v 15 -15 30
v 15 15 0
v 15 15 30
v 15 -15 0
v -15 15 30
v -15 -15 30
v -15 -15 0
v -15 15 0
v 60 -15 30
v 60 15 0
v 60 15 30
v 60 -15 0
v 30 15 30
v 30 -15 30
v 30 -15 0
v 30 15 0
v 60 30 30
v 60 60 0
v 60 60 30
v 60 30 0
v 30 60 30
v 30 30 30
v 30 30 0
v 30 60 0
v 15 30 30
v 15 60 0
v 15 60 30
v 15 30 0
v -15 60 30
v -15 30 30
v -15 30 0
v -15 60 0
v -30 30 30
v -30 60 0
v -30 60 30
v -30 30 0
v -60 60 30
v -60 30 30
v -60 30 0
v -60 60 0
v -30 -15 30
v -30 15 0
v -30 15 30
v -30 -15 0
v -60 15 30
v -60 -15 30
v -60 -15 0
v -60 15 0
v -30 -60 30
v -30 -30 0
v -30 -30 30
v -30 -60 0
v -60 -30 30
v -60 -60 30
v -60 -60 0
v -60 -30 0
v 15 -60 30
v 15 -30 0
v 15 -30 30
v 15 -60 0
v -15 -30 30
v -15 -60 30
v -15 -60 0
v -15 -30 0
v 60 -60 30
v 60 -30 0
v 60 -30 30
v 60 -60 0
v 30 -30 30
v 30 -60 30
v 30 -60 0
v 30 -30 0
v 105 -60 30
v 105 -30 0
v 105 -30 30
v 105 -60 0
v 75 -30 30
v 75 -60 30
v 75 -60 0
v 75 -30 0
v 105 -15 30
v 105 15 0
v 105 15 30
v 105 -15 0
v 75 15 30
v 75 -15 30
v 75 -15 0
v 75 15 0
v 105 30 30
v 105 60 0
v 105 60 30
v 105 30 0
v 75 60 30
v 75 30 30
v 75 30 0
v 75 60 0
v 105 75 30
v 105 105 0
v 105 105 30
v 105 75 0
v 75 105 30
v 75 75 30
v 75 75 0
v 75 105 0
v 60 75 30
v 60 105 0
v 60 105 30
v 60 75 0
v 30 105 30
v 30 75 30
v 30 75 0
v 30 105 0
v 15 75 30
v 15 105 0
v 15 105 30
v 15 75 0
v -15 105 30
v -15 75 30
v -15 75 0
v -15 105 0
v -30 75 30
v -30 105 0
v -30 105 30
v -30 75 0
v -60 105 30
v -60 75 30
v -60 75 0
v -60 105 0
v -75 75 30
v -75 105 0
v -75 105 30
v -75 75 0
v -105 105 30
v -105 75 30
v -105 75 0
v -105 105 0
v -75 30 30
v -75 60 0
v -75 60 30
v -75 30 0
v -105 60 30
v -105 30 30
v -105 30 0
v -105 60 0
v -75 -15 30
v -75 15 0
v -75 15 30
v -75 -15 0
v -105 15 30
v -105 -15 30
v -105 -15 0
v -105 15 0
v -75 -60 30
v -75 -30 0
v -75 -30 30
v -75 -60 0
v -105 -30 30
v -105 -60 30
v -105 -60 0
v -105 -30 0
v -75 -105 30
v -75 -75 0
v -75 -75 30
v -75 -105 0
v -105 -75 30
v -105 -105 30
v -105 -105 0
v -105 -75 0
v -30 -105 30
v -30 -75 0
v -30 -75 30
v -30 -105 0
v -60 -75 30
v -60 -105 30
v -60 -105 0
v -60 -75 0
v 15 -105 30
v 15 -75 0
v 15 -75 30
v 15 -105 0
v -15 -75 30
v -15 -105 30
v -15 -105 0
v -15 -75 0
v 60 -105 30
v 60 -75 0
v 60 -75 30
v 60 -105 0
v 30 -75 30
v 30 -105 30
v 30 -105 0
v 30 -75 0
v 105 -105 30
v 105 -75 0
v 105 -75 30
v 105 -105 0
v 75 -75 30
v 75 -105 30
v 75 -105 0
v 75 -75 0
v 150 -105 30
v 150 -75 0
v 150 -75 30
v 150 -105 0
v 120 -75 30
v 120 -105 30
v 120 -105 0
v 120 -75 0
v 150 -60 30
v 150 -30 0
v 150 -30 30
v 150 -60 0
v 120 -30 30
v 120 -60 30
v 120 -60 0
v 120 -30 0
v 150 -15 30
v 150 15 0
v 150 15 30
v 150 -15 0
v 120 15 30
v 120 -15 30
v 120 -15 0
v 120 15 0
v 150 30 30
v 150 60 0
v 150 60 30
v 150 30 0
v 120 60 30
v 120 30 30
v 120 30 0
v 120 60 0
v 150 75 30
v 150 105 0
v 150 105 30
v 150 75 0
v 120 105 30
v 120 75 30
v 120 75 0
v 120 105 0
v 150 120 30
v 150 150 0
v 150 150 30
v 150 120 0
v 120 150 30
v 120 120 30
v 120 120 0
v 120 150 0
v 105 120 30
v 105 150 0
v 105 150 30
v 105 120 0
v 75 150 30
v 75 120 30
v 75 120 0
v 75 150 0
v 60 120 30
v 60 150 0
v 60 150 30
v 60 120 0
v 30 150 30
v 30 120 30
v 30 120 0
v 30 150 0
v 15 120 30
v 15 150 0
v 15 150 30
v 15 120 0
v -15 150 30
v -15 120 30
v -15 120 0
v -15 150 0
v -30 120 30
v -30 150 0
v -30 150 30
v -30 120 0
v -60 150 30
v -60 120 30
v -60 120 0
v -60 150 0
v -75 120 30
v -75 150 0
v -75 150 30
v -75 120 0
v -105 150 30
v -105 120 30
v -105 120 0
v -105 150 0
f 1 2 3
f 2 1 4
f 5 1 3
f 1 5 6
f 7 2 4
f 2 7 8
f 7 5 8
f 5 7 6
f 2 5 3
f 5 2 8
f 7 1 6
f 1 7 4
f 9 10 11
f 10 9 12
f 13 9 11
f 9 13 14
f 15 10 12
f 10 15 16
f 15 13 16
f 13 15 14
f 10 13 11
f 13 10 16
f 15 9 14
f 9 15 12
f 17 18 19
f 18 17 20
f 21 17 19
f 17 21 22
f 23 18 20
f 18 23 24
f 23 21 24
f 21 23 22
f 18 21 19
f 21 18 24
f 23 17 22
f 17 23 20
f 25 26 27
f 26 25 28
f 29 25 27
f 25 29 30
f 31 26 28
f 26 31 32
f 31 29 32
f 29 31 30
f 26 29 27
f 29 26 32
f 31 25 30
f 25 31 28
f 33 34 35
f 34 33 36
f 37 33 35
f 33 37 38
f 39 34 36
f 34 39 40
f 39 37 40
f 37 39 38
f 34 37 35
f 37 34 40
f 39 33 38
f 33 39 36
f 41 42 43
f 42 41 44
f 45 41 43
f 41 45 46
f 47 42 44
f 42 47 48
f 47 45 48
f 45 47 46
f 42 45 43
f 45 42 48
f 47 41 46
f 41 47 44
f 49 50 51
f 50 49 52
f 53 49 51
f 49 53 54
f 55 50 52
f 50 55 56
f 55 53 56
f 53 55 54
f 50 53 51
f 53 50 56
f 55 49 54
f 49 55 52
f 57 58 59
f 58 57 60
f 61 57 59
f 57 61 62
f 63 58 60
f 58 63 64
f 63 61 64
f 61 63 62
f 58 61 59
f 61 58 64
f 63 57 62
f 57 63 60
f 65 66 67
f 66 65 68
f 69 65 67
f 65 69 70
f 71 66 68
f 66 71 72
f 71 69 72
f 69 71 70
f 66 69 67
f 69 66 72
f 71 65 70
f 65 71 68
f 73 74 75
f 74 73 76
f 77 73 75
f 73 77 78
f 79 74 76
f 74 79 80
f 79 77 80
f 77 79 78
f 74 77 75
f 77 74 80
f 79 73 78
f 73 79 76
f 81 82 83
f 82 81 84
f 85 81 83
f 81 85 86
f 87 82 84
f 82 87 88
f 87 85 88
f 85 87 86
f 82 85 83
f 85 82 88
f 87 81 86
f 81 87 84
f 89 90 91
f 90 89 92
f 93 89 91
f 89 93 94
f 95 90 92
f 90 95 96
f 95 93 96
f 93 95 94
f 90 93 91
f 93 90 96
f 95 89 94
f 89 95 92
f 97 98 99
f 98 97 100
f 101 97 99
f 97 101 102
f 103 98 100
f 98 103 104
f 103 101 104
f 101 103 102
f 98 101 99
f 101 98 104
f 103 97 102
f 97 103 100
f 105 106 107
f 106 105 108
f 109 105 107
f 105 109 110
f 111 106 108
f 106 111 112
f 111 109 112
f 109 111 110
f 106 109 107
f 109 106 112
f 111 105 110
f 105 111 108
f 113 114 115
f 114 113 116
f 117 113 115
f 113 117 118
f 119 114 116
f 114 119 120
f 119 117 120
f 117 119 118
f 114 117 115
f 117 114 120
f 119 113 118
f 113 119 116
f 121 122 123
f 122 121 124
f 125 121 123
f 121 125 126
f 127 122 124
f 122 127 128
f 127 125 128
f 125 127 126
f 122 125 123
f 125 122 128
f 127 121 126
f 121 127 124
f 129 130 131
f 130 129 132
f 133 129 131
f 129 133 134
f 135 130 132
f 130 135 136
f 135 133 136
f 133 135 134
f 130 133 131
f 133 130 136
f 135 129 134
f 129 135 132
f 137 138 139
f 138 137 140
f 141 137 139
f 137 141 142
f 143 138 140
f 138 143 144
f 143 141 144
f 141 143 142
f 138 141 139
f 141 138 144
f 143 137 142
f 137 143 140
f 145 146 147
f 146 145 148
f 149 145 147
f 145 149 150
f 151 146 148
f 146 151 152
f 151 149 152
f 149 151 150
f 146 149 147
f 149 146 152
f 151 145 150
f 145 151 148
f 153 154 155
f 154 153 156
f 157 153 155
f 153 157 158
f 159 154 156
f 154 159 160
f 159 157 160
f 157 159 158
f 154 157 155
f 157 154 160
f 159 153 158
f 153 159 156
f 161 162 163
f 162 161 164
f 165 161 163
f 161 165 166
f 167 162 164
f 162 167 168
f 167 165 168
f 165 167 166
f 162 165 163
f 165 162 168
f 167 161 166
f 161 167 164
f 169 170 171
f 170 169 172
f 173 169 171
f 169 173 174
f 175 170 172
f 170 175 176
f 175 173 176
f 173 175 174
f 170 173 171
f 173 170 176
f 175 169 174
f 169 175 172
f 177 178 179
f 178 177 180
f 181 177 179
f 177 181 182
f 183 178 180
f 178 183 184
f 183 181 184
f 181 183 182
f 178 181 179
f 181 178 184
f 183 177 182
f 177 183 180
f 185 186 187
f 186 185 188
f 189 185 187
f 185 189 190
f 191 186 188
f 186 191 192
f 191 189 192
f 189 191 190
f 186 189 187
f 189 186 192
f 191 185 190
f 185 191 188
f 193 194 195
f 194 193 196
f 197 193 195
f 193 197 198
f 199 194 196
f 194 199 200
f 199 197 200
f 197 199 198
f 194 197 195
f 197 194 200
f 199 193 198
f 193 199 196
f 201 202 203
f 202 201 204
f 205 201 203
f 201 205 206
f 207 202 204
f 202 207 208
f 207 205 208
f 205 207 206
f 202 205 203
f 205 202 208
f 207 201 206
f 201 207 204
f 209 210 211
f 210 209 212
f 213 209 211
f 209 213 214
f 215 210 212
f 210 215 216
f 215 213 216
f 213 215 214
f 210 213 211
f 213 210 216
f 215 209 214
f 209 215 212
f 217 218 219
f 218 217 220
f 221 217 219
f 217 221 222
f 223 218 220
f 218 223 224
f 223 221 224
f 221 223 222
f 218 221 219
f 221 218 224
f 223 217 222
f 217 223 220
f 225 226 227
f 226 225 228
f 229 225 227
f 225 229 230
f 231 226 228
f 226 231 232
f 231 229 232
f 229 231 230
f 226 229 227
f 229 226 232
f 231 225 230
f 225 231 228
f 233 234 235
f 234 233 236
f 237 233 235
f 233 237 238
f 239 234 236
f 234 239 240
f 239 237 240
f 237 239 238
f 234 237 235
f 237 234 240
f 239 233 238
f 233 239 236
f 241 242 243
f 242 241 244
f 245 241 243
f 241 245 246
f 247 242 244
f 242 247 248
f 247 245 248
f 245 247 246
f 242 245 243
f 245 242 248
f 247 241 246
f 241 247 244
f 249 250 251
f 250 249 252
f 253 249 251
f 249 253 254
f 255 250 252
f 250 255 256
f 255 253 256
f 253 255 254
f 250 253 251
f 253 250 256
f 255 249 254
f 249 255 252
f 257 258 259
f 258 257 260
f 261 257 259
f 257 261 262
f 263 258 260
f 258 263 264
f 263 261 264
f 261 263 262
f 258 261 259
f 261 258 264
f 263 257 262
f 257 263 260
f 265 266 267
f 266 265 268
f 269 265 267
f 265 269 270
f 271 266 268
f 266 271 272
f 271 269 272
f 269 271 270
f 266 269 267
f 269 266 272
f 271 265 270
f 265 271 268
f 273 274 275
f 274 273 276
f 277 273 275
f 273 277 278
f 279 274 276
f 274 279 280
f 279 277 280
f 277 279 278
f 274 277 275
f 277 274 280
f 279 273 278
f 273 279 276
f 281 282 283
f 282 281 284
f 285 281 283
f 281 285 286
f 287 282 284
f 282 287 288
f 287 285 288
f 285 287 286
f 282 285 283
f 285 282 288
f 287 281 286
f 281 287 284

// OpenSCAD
//------------------------------------------------------------------------------------------
// THIS CODE WAS GENERATED WITH GRAPHSCAD
//------------------------------------------------------------------------------------------
// F:/workspace/graphscad/graphscadfiles/ulam_spiral.scad
//------------------------------------------------------------------------------------------
// Graphscad is a graphical nodal editor to create .SCAD files
//
// More info here : http://graphscad.free.fr
//
// Scad Files created with Graphscad can be edited by graphscad
// Scad Files created with Graphscad can be read by Openscad
//
//------------------------------------------------------------------------------------------
$vpr=[60,0,300];
$vpt=[22,22,15];
$vpd=780;
module ulam_spiral(primefield=[
[ 0,  0,  1,1,1,0,0,0,0,0],
[1, 0, 2,1,2,0,0,0,0,0],
[1, 1, 3,1,3,0,0,0,0,0],
[0, 1, 4,2,2,2,0,0,0,0],
[-1, 1, 5,1,5,0,0,0,0,0],
[-1, 0, 6,2,2,3,0,0,0,0],
[-1, -1, 7,1,7,0,0,0,0,0],
[0, -1, 8,3,2,2,2,0,0,0],
[1, -1, 9,2,3,3,0,0,0,0],
[2, -1, 10,2,2,5,0,0,0,0],
[2, 0, 11,1,11,0,0,0,0,0],
[2, 1, 12,3,2,2,3,0,0,0],
[2, 2, 13,1,13,0,0,0,0,0],
[1, 2, 14,2,2,7,0,0,0,0],
[0, 2, 15,2,3,5,0,0,0,0],
[-1, 2, 16,4,2,2,2,2,0,0],
[-2, 2, 17,1,17,0,0,0,0,0],
[-2, 1, 18,3,2,3,3,0,0,0],
[-2, 0, 19,1,19,0,0,0,0,0],
[-2, -1, 20,3,2,2,5,0,0,0],
[-2, -2, 21,2,3,7,0,0,0,0],
[-1, -2, 22,2,2,11,0,0,0,0],
[0, -2, 23,1,23,0,0,0,0,0],
[1, -2, 24,4,2,2,2,3,0,0],
[2, -2, 25,2,5,5,0,0,0,0],
[3, -2, 26,2,2,13,0,0,0,0],
[3, -1, 27,3,3,3,3,0,0,0],
[3, 0, 28,3,2,2,7,0,0,0],
[3, 1, 29,1,29,0,0,0,0,0],
[3, 2, 30,3,2,3,5,0,0,0],
[3, 3, 31,1,31,0,0,0,0,0],
[2, 3, 32,5,2,2,2,2,2,0],
[1, 3, 33,2,3,11,0,0,0,0],
[0, 3, 34,2,2,17,0,0,0,0],
[-1, 3, 35,2,5,7,0,0,0,0,0],
[-2, 3, 36,4,2,2,3,3,0,0]
],feldbreite=45,wuerfelseite=30)
{
 function node_cube_matrix(i=0,j=0,k=0,l=0,m=0,n=0) = translate([-wuerfelseite/2,-wuerfelseite/2,0]);
 module node_cube(i=0,j=0,k=0,l=0,m=0,n=0)
 {
  translate([-wuerfelseite/2,-wuerfelseite/2,0])cube([wuerfelseite,wuerfelseite,wuerfelseite],center=false);
 }
 function node_color_matrix(i=0,j=0,k=0,l=0,m=0,n=0) = node_cube_matrix(i=i,j=j,k=k,l=l,m=m,n=n);
 module node_color(i=0,j=0,k=0,l=0,m=0,n=0)
 {
  {
   color([0,0,0,1])node_cube(i,j,k,l,m,n);
  }
 }
 function node_color0_matrix(i=0,j=0,k=0,l=0,m=0,n=0) = node_cube_matrix(i=i,j=j,k=k,l=l,m=m,n=n);
 module node_color0(i=0,j=0,k=0,l=0,m=0,n=0)
 {
  {
   color([1,1,1,1])node_cube(i,j,k,l,m,n);
  }
 }
 function node_for_matrix(i=0,j=0,k=0,l=0,m=0,n=0) = node_translate_matrix(i=i,j=j,k=k,l=l,m=m,n=n);
 module node_for(i=0,j=0,k=0,l=0,m=0,n=0)
 {
  for(i=[0:1:len(primefield)-1])
  {
   node_translate(i,j,k,l,m,n);
  }
 }
 function node_translate_matrix(i=0,j=0,k=0,l=0,m=0,n=0) = translate([primefield[i][0]*feldbreite,primefield[i][1]*feldbreite,0])*node_switchcase_matrix(i=i,j=j,k=k,l=l,m=m,n=n);
 module node_translate(i=0,j=0,k=0,l=0,m=0,n=0)
 {
  translate([primefield[i][0]*feldbreite,primefield[i][1]*feldbreite,0])node_switchcase(i,j,k,l,m,n);
 }
 function node_color1_matrix(i=0,j=0,k=0,l=0,m=0,n=0) = node_cube_matrix(i=i,j=j,k=k,l=l,m=m,n=n);
 module node_color1(i=0,j=0,k=0,l=0,m=0,n=0)
 {
  {
   color([1,1,0,1])node_cube(i,j,k,l,m,n);
  }
 }
 function node_switchcase_matrix(i=0,j=0,k=0,l=0,m=0,n=0) = node_color1_matrix(i=i,j=j,k=k,l=l,m=m,n=n);
 module node_switchcase(i=0,j=0,k=0,l=0,m=0,n=0)
 {
  if(primefield[i][2]==1)
  {
   node_color1(i,j,k,l,m,n);
  }
  else
  {
   if(primefield[i][3]==1)
   {
    node_color(i,j,k,l,m,n);
   }
   else
   {
    if(true)
    {
     node_color0(i,j,k,l,m,n);
    }
   }
  }
 }
 node_for();
 /*--------------------------------------------------------------------------------------------------------
  Graphscad Utils functions
  This code is Used By Graphscad Nodal Editor to generate SCAD files
 --------------------------------------------------------------------------------------------------------*/
 function det4x4(a) =
 a[0][0]*a[1][1]*a[2][2]*a[3][3] + a[0][0]*a[1][2]*a[2][3]*a[3][1] + a[0][0]*a[1][3]*a[2][1]*a[3][2]
 + a[0][1]*a[1][0]*a[2][3]*a[3][2] + a[0][1]*a[1][2]*a[2][0]*a[3][3] + a[0][1]*a[1][3]*a[2][2]*a[3][0]
 + a[0][2]*a[1][0]*a[2][1]*a[3][3] + a[0][2]*a[1][1]*a[2][3]*a[3][0] + a[0][2]*a[1][3]*a[2][0]*a[3][1]
 + a[0][3]*a[1][0]*a[2][2]*a[3][1] + a[0][3]*a[1][1]*a[2][0]*a[3][2] + a[0][3]*a[1][2]*a[2][1]*a[3][0]
 - a[0][0]*a[1][1]*a[2][3]*a[3][2] - a[0][0]*a[1][2]*a[2][1]*a[3][3] - a[0][0]*a[1][3]*a[2][2]*a[3][1]
 - a[0][1]*a[1][0]*a[2][2]*a[3][3] - a[0][1]*a[1][2]*a[2][3]*a[3][0] - a[0][1]*a[1][3]*a[2][0]*a[3][2]
 - a[0][2]*a[1][0]*a[2][3]*a[3][1] - a[0][2]*a[1][1]*a[2][0]*a[3][3] - a[0][2]*a[1][3]*a[2][1]*a[3][0]
 - a[0][3]*a[1][0]*a[2][1]*a[3][2] - a[0][3]*a[1][1]*a[2][2]*a[3][0] - a[0][3]*a[1][2]*a[2][0]*a[3][1];
 function invb00(a) = a[1][1]*a[2][2]*a[3][3] + a[1][2]*a[2][3]*a[3][1] + a[1][3]*a[2][1]*a[3][2] - a[1][1]*a[2][3]*a[3][2] - a[1][2]*a[2][1]*a[3][3] - a[1][3]*a[2][2]*a[3][1];
 function invb01(a) = a[0][1]*a[2][3]*a[3][2] + a[0][2]*a[2][1]*a[3][3] + a[0][3]*a[2][2]*a[3][1] - a[0][1]*a[2][2]*a[3][3] - a[0][2]*a[2][3]*a[3][1] - a[0][3]*a[2][1]*a[3][2];
 function invb02(a) = a[0][1]*a[1][2]*a[3][3] + a[0][2]*a[1][3]*a[3][1] + a[0][3]*a[1][1]*a[3][2] - a[0][1]*a[1][3]*a[3][2] - a[0][2]*a[1][1]*a[3][3] - a[0][3]*a[1][2]*a[3][1];
 function invb03(a) = a[0][1]*a[1][3]*a[2][2] + a[0][2]*a[1][1]*a[2][3] + a[0][3]*a[1][2]*a[2][1] - a[0][1]*a[1][2]*a[2][3] - a[0][2]*a[1][3]*a[2][1] - a[0][3]*a[1][1]*a[2][2];
 function invb10(a) = a[1][0]*a[2][3]*a[3][2] + a[1][2]*a[2][0]*a[3][3] + a[1][3]*a[2][2]*a[3][0] - a[1][0]*a[2][2]*a[3][3] - a[1][2]*a[2][3]*a[3][0] - a[1][3]*a[2][0]*a[3][2];
 function invb11(a) = a[0][0]*a[2][2]*a[3][3] + a[0][2]*a[2][3]*a[3][0] + a[0][3]*a[2][0]*a[3][2] - a[0][0]*a[2][3]*a[3][2] - a[0][2]*a[2][0]*a[3][3] - a[0][3]*a[2][2]*a[3][0];
 function invb12(a) = a[0][0]*a[1][3]*a[3][2] + a[0][2]*a[1][0]*a[3][3] + a[0][3]*a[1][2]*a[3][0] - a[0][0]*a[1][2]*a[3][3] - a[0][2]*a[1][3]*a[3][0] - a[0][3]*a[1][0]*a[3][2];
 function invb13(a) = a[0][0]*a[1][2]*a[2][3] + a[0][2]*a[1][3]*a[2][0] + a[0][3]*a[1][0]*a[2][2] - a[0][0]*a[1][3]*a[2][2] - a[0][2]*a[1][0]*a[2][3] - a[0][3]*a[1][2]*a[2][0];
 function invb20(a) = a[1][0]*a[2][1]*a[3][3] + a[1][1]*a[2][3]*a[3][0] + a[1][3]*a[2][0]*a[3][1] - a[1][0]*a[2][3]*a[3][1] - a[1][1]*a[2][0]*a[3][3] - a[1][3]*a[2][1]*a[3][0];
 function invb21(a) = a[0][0]*a[2][3]*a[3][1] + a[0][1]*a[2][0]*a[3][3] + a[0][3]*a[2][1]*a[3][0] - a[0][0]*a[2][1]*a[3][3] - a[0][1]*a[2][3]*a[3][0] - a[0][3]*a[2][0]*a[3][1];
 function invb22(a) = a[0][0]*a[1][1]*a[3][3] + a[0][1]*a[1][3]*a[3][0] + a[0][3]*a[1][0]*a[3][1] - a[0][0]*a[1][3]*a[3][1] - a[0][1]*a[1][0]*a[3][3] - a[0][3]*a[1][1]*a[3][0];
 function invb23(a) = a[0][0]*a[1][3]*a[2][1] + a[0][1]*a[1][0]*a[2][3] + a[0][3]*a[1][1]*a[2][0] - a[0][0]*a[1][1]*a[2][3] - a[0][1]*a[1][3]*a[2][0] - a[0][3]*a[1][0]*a[2][1];
 function invb30(a) = a[1][0]*a[2][2]*a[3][1] + a[1][1]*a[2][0]*a[3][2] + a[1][2]*a[2][1]*a[3][0] - a[1][0]*a[2][1]*a[3][2] - a[1][1]*a[2][2]*a[3][0] - a[1][2]*a[2][0]*a[3][1];
 function invb31(a) = a[0][0]*a[2][1]*a[3][2] + a[0][1]*a[2][2]*a[3][0] + a[0][2]*a[2][0]*a[3][1] - a[0][0]*a[2][2]*a[3][1] - a[0][1]*a[2][0]*a[3][2] - a[0][2]*a[2][1]*a[3][0];
 function invb32(a) = a[0][0]*a[1][2]*a[3][1] + a[0][1]*a[1][0]*a[3][2] + a[0][2]*a[1][1]*a[3][0] - a[0][0]*a[1][1]*a[3][2] - a[0][1]*a[1][2]*a[3][0] - a[0][2]*a[1][0]*a[3][1];
 function invb33(a) = a[0][0]*a[1][1]*a[2][2] + a[0][1]*a[1][2]*a[2][0] + a[0][2]*a[1][0]*a[2][1] - a[0][0]*a[1][2]*a[2][1] - a[0][1]*a[1][0]*a[2][2] - a[0][2]*a[1][1]*a[2][0];
 function inv4x4(a)= (1/det4x4(a))*[
 [invb00(a),invb01(a),invb02(a),invb03(a)],
 [invb10(a),invb11(a),invb12(a),invb13(a)],
 [invb20(a),invb21(a),invb22(a),invb23(a)],
 [invb30(a),invb31(a),invb32(a),invb33(a)]];
 function onlytranslate(a)=  [
                        [1,0,0,a[0][3]],
                        [0,1,0,a[1][3]],
                        [0,0,1,a[2][3]],
                        [0,0,0,1]];
 function negonlytranslate(a)=[
                        [1,0,0,-a[0][3]],
                        [0,1,0,-a[1][3]],
                        [0,0,1,-a[2][3]],
                        [0,0,0,1]];
 function lookatvec(t,parentmat) = [t[0]-parentmat[0][3],
                                 t[1]-parentmat[1][3],
                                 t[2]-parentmat[2][3]];
 /*
              rx = '0'
              ry = 'acos('+tz+'/norm(['+tx+','+ty+','+tz+']))'
              rz = 'atan2('+ty+','+tx+')'
 */
 function lookatrot(t,parentmat) = [0,
                                 acos((t[2]-parentmat[2][3])/norm(lookatvec(t,parentmat))),
                                 atan2(t[1]-parentmat[1][3],t[0]-parentmat[0][3])];
 function gettranslation(m) = [m[0][3],m[1][3],m[2][3]];
 function vectormulmatrix(v,m) = m*v;
 function vectorlength(v) = norm(v);
 function vectorx(v) = v[0];
 function vectory(v) = v[1];
 function vectorz(v) = v[2];
 function vectoradd(a,b) = (a+b);
 function vectorsub(a,b) = (a-b);
 function vectormul(a,b) = (a*b);
 function vectordiv(a,b) = (a*(1/b));
 function scale(v)=[[v[0],0,0,0],
                    [0,v[1],0,0],
                    [0,0,v[2],0],
                    [0,0,0,1]];
 function rotatex(a)=[[1,0,0,0],
                      [0,cos(a),-sin(a),0],
                      [0,sin(a),cos(a),0],
                      [0,0,0,1]];
 function rotatey(a)=[[cos(a),0,sin(a),0],
                      [0,1,0,0],
                      [-sin(a),0,cos(a),0],
                      [0,0,0,1]];
 function rotatez(a)=[[cos(a),-sin(a),0,0],
                      [sin(a),cos(a),0,0],
                      [0,0,1,0],
                      [0,0,0,1]];
 function rotatea(c,s,l,m,n)=[[l*l*(1-c)+c,m*l*(1-c)-n*s,n*l*(1-c)+m*s,0],
                              [l*m*(1-c)+n*s,m*m*(1-c)+c,n*m*(1-c)-l*s,0],
                              [l*n*(1-c)-m*s,m*n*(1-c)+l*s,n*n*(1-c)+c,0],
                              [0,0,0,1]];
 function rotateanv(a,nv)=rotatea(cos(a),sin(a),nv[0],nv[1],nv[2]);
 function rotate(a,v, normV=true)=(v==undef)?rotatez(a[2])*rotatey(a[1])*rotatex(a[0]):
                      normV ? rotateanv(a,v/sqrt(v*v)) : rotateanv(a,v);
 function translate(v)=[[1,0,0,v[0]],
                        [0,1,0,v[1]],
                        [0,0,1,v[2]],
                        [0,0,0,1]];
 function mirrorabc(a,b,c)=[[1-2*a*a,-2*a*b,-2*a*c,0],
                            [-2*a*b,1-2*b*b,-2*b*c,0],
                            [-2*a*c,-2*b*c,1-2*c*c,0],
                            [0,0,0,1]];
 function mirrornv(nv)=mirrorabc(nv[0],nv[1],nv[2]);
 function mirror(v)=mirrornv(v/sqrt(v*v));
}
ulam_spiral();


/*BEGINGRAPHSCAD{
    "nodes": [
        {
            "name": "node_param",
            "inputplugs": [
                {
                    "type": "param",
                    "name": "previousparam",
                    "value": ""
                },
                {
                    "type": "str",
                    "name": "name",
                    "value": "primefield"
                },
                {
                    "connection": "node_string.string",
                    "type": "str",
                    "name": "string",
                    "value": "0"
                }
            ],
            "typename": "Node_param",
            "version": 1,
            "y": -5735.46674393634,
            "x": -19781.285618319223
        },
        {
            "name": "node_string",
            "inputplugs": [
                {
                    "multiline": true,
                    "type": "str",
                    "name": "string",
                    "value": "[ \n[ 0,  0,  1,1,1,0,0,0,0,0],\n[1, 0, 2,1,2,0,0,0,0,0],\n[1, 1, 3,1,3,0,0,0,0,0],\n[0, 1, 4,2,2,2,0,0,0,0],\n[-1, 1, 5,1,5,0,0,0,0,0],\n[-1, 0, 6,2,2,3,0,0,0,0],\n[-1, -1, 7,1,7,0,0,0,0,0],\n[0, -1, 8,3,2,2,2,0,0,0],\n[1, -1, 9,2,3,3,0,0,0,0],\n[2, -1, 10,2,2,5,0,0,0,0], \n[2, 0, 11,1,11,0,0,0,0,0],\n[2, 1, 12,3,2,2,3,0,0,0],\n[2, 2, 13,1,13,0,0,0,0,0],\n[1, 2, 14,2,2,7,0,0,0,0],\n[0, 2, 15,2,3,5,0,0,0,0],\n[-1, 2, 16,4,2,2,2,2,0,0],\n[-2, 2, 17,1,17,0,0,0,0,0],\n[-2, 1, 18,3,2,3,3,0,0,0],\n[-2, 0, 19,1,19,0,0,0,0,0],\n[-2, -1, 20,3,2,2,5,0,0,0],  \n[-2, -2, 21,2,3,7,0,0,0,0],\n[-1, -2, 22,2,2,11,0,0,0,0],\n[0, -2, 23,1,23,0,0,0,0,0],\n[1, -2, 24,4,2,2,2,3,0,0],\n[2, -2, 25,2,5,5,0,0,0,0],\n[3, -2, 26,2,2,13,0,0,0,0],\n[3, -1, 27,3,3,3,3,0,0,0],\n[3, 0, 28,3,2,2,7,0,0,0],\n[3, 1, 29,1,29,0,0,0,0,0],\n[3, 2, 30,3,2,3,5,0,0,0],\t\n[3, 3, 31,1,31,0,0,0,0,0],\n[2, 3, 32,5,2,2,2,2,2,0],\n[1, 3, 33,2,3,11,0,0,0,0],\n[0, 3, 34,2,2,17,0,0,0,0],\n[-1, 3, 35,2,5,7,0,0,0,0,0],\n[-2, 3, 36,4,2,2,3,3,0,0]\n]"
                }
            ],
            "typename": "Node_string",
            "version": 1,
            "y": -5544.539176454206,
            "x": -19944.056892136592
        },
        {
            "name": "node_cube",
            "inputplugs": [
                {
                    "tip": "x size of cube",
                    "type": "str",
                    "name": "sizex",
                    "value": "wuerfelseite"
                },
                {
                    "tip": "y size of cube",
                    "type": "str",
                    "name": "sizey",
                    "value": "wuerfelseite"
                },
                {
                    "tip": "z size of cube",
                    "type": "str",
                    "name": "sizez",
                    "value": "wuerfelseite"
                },
                {
                    "tip": "x translation of output object",
                    "type": "str",
                    "name": "tx",
                    "value": "-wuerfelseite/2"
                },
                {
                    "tip": "y translation of output object",
                    "type": "str",
                    "name": "ty",
                    "value": "-wuerfelseite/2"
                },
                {
                    "tip": "z translation of output object",
                    "type": "str",
                    "name": "tz",
                    "value": "0"
                },
                {
                    "tip": "centering of cube",
                    "type": "str",
                    "name": "center",
                    "value": "false",
                    "combo": [
                        "true",
                        "false"
                    ]
                }
            ],
            "typename": "Node_cube",
            "version": 1,
            "y": -5091.632491153332,
            "x": -19860.751354878095
        },
        {
            "name": "node_color",
            "inputplugs": [
                {
                    "tip": "input 3D object",
                    "connection": "node_cube.object",
                    "type": "object",
                    "name": "object",
                    "value": ""
                },
                {
                    "alias": "red",
                    "tip": "red  (expression or string from 0 to 1)",
                    "type": "str",
                    "name": "r",
                    "value": "0"
                },
                {
                    "alias": "green",
                    "tip": "green  (expression or string from 0 to 1)",
                    "type": "str",
                    "name": "g",
                    "value": "0"
                },
                {
                    "alias": "blue",
                    "tip": "blue  (expression or string from 0 to 1)",
                    "type": "str",
                    "name": "b",
                    "value": "0"
                },
                {
                    "alias": "alpha",
                    "tip": "alpha (expression or string from 0 to 1)",
                    "type": "str",
                    "name": "a",
                    "value": "1"
                }
            ],
            "typename": "Node_color",
            "version": 1,
            "y": -5103.718394916514,
            "x": -19668.18755967493
        },
        {
            "name": "node_color0",
            "inputplugs": [
                {
                    "tip": "input 3D object",
                    "connection": "node_cube.object",
                    "type": "object",
                    "name": "object",
                    "value": ""
                },
                {
                    "alias": "red",
                    "tip": "red  (expression or string from 0 to 1)",
                    "type": "str",
                    "name": "r",
                    "value": "1"
                },
                {
                    "alias": "green",
                    "tip": "green  (expression or string from 0 to 1)",
                    "type": "str",
                    "name": "g",
                    "value": "1"
                },
                {
                    "alias": "blue",
                    "tip": "blue  (expression or string from 0 to 1)",
                    "type": "str",
                    "name": "b",
                    "value": "1"
                },
                {
                    "alias": "alpha",
                    "tip": "alpha (expression or string from 0 to 1)",
                    "type": "str",
                    "name": "a",
                    "value": "1"
                }
            ],
            "typename": "Node_color",
            "version": 1,
            "y": -4919.422163355028,
            "x": -19670.745270107305
        },
        {
            "name": "node_param0",
            "inputplugs": [
                {
                    "connection": "node_param.nextparam",
                    "type": "param",
                    "name": "previousparam",
                    "value": ""
                },
                {
                    "type": "str",
                    "name": "name",
                    "value": "feldbreite"
                },
                {
                    "type": "str",
                    "name": "string",
                    "value": "45"
                }
            ],
            "typename": "Node_param",
            "version": 1,
            "y": -5734.455235914818,
            "x": -19460.969196782986
        },
        {
            "name": "node_param1",
            "inputplugs": [
                {
                    "connection": "node_param0.nextparam",
                    "type": "param",
                    "name": "previousparam",
                    "value": ""
                },
                {
                    "type": "str",
                    "name": "name",
                    "value": "wuerfelseite"
                },
                {
                    "type": "str",
                    "name": "string",
                    "value": "30"
                }
            ],
            "typename": "Node_param",
            "version": 1,
            "y": -5734.8890866674565,
            "x": -19187.0203797281
        },
        {
            "name": "node_for",
            "inputplugs": [
                {
                    "tip": "input object",
                    "connection": "node_translate.object",
                    "type": "object",
                    "name": "object",
                    "value": ""
                },
                {
                    "tip": "name of variable that will change during loop",
                    "type": "str",
                    "name": "variablename",
                    "value": "i",
                    "combo": [
                        "i",
                        "j",
                        "k",
                        "l",
                        "m",
                        "n"
                    ]
                },
                {
                    "tip": "start value of variable used in loop",
                    "type": "str",
                    "name": "start",
                    "value": "0"
                },
                {
                    "tip": "target value of variable used in loop",
                    "type": "str",
                    "name": "end",
                    "value": "len(primefield)-1"
                },
                {
                    "tip": "increment of variable for each loop",
                    "type": "str",
                    "name": "step",
                    "value": "1"
                }
            ],
            "typename": "Node_for",
            "version": 1,
            "y": -5123.61530683447,
            "x": -18762.163039660376
        },
        {
            "name": "node_translate",
            "inputplugs": [
                {
                    "connection": "node_switchcase.object",
                    "type": "object",
                    "name": "object",
                    "value": ""
                },
                {
                    "type": "str",
                    "name": "tx",
                    "value": "primefield[i][0]*feldbreite"
                },
                {
                    "type": "str",
                    "name": "ty",
                    "value": "primefield[i][1]*feldbreite"
                },
                {
                    "type": "str",
                    "name": "tz",
                    "value": "0"
                },
                {
                    "type": "str",
                    "name": "space",
                    "value": "world",
                    "combo": [
                        "world",
                        "object",
                        "local"
                    ]
                }
            ],
            "typename": "Node_translate",
            "version": 1,
            "y": -5179.386119686793,
            "x": -19019.521996869735
        },
        {
            "name": "node_color1",
            "inputplugs": [
                {
                    "tip": "input 3D object",
                    "connection": "node_cube.object",
                    "type": "object",
                    "name": "object",
                    "value": ""
                },
                {
                    "alias": "red",
                    "tip": "red  (expression or string from 0 to 1)",
                    "type": "str",
                    "name": "r",
                    "value": "1"
                },
                {
                    "alias": "green",
                    "tip": "green  (expression or string from 0 to 1)",
                    "type": "str",
                    "name": "g",
                    "value": "1"
                },
                {
                    "alias": "blue",
                    "tip": "blue  (expression or string from 0 to 1)",
                    "type": "str",
                    "name": "b",
                    "value": "0"
                },
                {
                    "alias": "alpha",
                    "tip": "alpha (expression or string from 0 to 1)",
                    "type": "str",
                    "name": "a",
                    "value": "1"
                }
            ],
            "typename": "Node_color",
            "version": 1,
            "y": -5290.894826622674,
            "x": -19665.49654496764
        },
        {
            "name": "node_comment",
            "inputplugs": [
                {
                    "tip": "comment string to display on background",
                    "type": "str",
                    "name": "comment",
                    "value": "Ulam spiral from precomputed position and factorisation (primefield)\nThe data set is :\npos0: x-position on spiral\npos1: y-position on spiral\npos2: number\npos3: number of prime factors of number (1 for number 1)\npos4-pos9: prime factors of number or 0"
                }
            ],
            "typename": "Node_comment",
            "version": 1,
            "y": -5762.490807613125,
            "x": -20477.293272376293
        },
        {
            "name": "node_globalsettings",
            "inputplugs": [
                {
                    "tip": " the minimum angle for a fragment",
                    "type": "str",
                    "name": "$fa",
                    "value": ""
                },
                {
                    "tip": "minimum size of a fragment",
                    "type": "str",
                    "name": "$fs",
                    "value": ""
                },
                {
                    "tip": "When this variable has a value greater than zero, $fa and $fs are ignored and full circle is rendered using this number of fragments",
                    "type": "str",
                    "name": "$fn",
                    "value": ""
                },
                {
                    "tip": "viewport rotation",
                    "type": "str",
                    "name": "$vpr",
                    "value": "[60,0,300]"
                },
                {
                    "tip": "viewport translation",
                    "type": "str",
                    "name": "$vpt",
                    "value": "[22,22,15]"
                },
                {
                    "tip": "viewport camera distance",
                    "type": "str",
                    "name": "$vpd",
                    "value": "780"
                },
                {
                    "tip": "The $t variable is used for animation",
                    "type": "str",
                    "name": "$t",
                    "value": ""
                }
            ],
            "typename": "Node_globalsettings",
            "version": 1,
            "y": -5548.731125895885,
            "x": -19687.915774904584
        },
        {
            "name": "node_switchcase",
            "inputplugs": [
                {
                    "tip": "boolean expression1 to evaluate",
                    "type": "str",
                    "name": "expression1",
                    "value": "primefield[i][2]==1"
                },
                {
                    "tip": "object to output if exression1 is true",
                    "connection": "node_color1.object",
                    "type": "object",
                    "name": "object1",
                    "value": ""
                },
                {
                    "tip": "boolean expression2 to evaluate",
                    "type": "str",
                    "name": "expression2",
                    "value": "primefield[i][3]==1"
                },
                {
                    "tip": "object to output if exression2 is true",
                    "connection": "node_color.object",
                    "type": "object",
                    "name": "object2",
                    "value": ""
                },
                {
                    "tip": "boolean expression3 to evaluate",
                    "type": "str",
                    "name": "expression3",
                    "value": ""
                },
                {
                    "tip": "object to output if exression3 is true",
                    "connection": "node_color0.object",
                    "type": "object",
                    "name": "object3",
                    "value": ""
                },
                {
                    "tip": "boolean expression4 to evaluate",
                    "type": "str",
                    "name": "expression4",
                    "value": ""
                },
                {
                    "tip": "object to output if exression4 is true",
                    "type": "object",
                    "name": "object4",
                    "value": ""
                },
                {
                    "tip": "boolean expression5 to evaluate",
                    "type": "str",
                    "name": "expression5",
                    "value": ""
                },
                {
                    "tip": "object to output if exression5 is true",
                    "type": "object",
                    "name": "object5",
                    "value": ""
                },
                {
                    "tip": "boolean expression6 to evaluate",
                    "type": "str",
                    "name": "expression6",
                    "value": ""
                },
                {
                    "tip": "object to output if exression6 is true",
                    "type": "object",
                    "name": "object6",
                    "value": ""
                },
                {
                    "tip": "boolean expression7 to evaluate",
                    "type": "str",
                    "name": "expression7",
                    "value": ""
                },
                {
                    "tip": "object to output if exression7 is true",
                    "type": "object",
                    "name": "object7",
                    "value": ""
                },
                {
                    "tip": "boolean expression8 to evaluate",
                    "type": "str",
                    "name": "expression8",
                    "value": ""
                },
                {
                    "tip": "object to output if exression8 is true",
                    "type": "object",
                    "name": "object8",
                    "value": ""
                },
                {
                    "tip": "boolean expression9 to evaluate",
                    "type": "str",
                    "name": "expression9",
                    "value": ""
                },
                {
                    "tip": "object to output if exression9 is true",
                    "type": "object",
                    "name": "object9",
                    "value": ""
                },
                {
                    "tip": "boolean expression10 to evaluate",
                    "type": "str",
                    "name": "expression10",
                    "value": ""
                },
                {
                    "tip": "object to output if exression10 is true",
                    "type": "object",
                    "name": "object10",
                    "value": ""
                }
            ],
            "typename": "Node_switchcase",
            "version": 1,
            "y": -5224.314194126834,
            "x": -19331.4444532286
        },
        {
            "name": "node_comment0",
            "inputplugs": [
                {
                    "tip": "comment string to display on background",
                    "type": "str",
                    "name": "comment",
                    "value": "THIS EXAMPLE WAS CREATED BY Kpacnaja_Shapotshka"
                }
            ],
            "typename": "Node_comment",
            "version": 1,
            "y": -5833.258693187343,
            "x": -20482.420660989617
        }
    ],
    "version": 2
}ENDGRAPHSCAD*/
